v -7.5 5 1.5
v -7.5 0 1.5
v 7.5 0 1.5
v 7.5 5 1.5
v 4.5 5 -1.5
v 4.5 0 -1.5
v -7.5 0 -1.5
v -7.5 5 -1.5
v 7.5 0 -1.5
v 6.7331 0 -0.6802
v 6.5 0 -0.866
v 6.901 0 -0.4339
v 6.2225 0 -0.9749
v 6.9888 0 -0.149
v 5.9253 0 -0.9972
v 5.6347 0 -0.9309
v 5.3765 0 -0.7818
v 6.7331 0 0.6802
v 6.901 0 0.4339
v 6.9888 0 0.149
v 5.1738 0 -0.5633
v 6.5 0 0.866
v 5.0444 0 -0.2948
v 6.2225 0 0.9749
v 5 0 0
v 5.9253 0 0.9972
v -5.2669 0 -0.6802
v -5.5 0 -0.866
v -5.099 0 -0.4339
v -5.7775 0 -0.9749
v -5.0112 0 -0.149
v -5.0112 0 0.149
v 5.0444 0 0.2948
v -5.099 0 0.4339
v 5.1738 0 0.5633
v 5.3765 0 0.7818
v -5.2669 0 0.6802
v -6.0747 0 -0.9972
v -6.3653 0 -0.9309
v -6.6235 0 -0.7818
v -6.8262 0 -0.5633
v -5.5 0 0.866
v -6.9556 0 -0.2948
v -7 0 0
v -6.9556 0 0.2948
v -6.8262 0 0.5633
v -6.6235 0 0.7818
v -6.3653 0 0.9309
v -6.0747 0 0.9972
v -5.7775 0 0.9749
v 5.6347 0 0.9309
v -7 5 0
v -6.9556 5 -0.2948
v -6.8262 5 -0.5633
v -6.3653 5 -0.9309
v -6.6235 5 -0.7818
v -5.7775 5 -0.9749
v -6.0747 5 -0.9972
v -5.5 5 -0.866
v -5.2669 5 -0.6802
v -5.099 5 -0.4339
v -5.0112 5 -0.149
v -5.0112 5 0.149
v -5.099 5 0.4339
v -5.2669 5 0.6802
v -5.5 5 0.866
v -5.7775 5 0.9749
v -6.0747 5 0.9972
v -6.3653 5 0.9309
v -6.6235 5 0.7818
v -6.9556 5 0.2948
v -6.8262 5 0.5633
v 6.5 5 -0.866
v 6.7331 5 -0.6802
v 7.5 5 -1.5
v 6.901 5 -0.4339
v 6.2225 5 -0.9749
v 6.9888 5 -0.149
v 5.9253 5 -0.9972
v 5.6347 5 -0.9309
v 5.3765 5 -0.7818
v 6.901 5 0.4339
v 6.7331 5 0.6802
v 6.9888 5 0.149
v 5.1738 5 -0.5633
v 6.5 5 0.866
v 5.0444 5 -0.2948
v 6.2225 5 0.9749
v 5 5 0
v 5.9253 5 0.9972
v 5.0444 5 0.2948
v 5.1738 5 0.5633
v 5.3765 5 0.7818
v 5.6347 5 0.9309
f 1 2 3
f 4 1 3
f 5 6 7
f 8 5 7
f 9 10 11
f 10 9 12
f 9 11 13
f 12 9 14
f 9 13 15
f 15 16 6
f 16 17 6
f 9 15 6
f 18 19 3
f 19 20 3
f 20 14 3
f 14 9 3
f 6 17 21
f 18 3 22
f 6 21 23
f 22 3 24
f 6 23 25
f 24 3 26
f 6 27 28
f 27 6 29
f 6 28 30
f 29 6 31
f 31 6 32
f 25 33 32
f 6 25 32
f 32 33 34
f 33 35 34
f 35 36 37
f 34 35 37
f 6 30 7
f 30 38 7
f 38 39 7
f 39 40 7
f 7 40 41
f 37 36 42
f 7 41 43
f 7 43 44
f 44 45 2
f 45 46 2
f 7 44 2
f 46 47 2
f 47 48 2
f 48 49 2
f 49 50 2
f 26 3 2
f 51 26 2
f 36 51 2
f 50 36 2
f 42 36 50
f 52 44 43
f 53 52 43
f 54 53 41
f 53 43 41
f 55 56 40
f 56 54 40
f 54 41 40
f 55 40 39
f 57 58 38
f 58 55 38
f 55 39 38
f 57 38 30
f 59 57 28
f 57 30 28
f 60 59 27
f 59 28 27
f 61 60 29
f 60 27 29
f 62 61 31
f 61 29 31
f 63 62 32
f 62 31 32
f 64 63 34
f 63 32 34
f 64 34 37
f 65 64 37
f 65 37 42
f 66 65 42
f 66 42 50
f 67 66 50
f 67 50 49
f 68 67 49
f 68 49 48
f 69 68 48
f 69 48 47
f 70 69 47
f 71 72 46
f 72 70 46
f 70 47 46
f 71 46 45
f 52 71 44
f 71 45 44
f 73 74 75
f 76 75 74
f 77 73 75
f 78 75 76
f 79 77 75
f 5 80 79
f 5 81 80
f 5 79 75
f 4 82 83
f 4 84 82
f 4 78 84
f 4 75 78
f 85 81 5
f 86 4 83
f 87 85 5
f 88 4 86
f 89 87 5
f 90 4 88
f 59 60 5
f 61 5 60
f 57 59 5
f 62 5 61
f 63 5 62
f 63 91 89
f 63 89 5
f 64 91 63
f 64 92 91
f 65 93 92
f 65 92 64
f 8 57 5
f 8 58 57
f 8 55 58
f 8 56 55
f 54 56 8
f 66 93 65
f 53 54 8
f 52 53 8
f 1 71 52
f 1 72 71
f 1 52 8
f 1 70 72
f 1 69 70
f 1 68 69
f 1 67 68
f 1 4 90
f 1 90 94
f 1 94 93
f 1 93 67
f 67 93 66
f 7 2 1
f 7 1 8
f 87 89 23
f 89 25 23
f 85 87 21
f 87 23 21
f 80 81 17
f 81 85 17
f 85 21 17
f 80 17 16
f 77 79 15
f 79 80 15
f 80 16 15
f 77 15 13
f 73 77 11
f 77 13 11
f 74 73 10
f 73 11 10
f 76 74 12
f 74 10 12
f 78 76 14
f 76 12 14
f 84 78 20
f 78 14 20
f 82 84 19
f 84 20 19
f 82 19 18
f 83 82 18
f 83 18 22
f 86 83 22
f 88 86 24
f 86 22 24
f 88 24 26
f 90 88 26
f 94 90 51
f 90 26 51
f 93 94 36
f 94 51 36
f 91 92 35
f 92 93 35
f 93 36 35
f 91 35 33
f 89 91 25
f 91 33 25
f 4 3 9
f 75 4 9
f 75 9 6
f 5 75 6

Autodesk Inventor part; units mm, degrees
ref_plane "YZ Plane" through (0, 0, 0) normal (1, 0, 0) x (0, 1, 0)
ref_plane "XZ Plane" through (0, 0, 0) normal (0, 1, 0) x (-1, 0, 0)
ref_plane "XY Plane" through (0, 0, 0) normal (0, 0, 1) x (1, 0, 0)
sketch "Sketch1" plane through (0, 0, 0) normal (0, 1, 0) x (-1, 0, 0)
  line L0 (-7.5, -1.5) -> (7.5, -1.5)
  line L1 (7.5, 3.5) -> (7.5, 3.5)
  line L2 (7.5, 1.5) -> (-7.5, 1.5)
  line L3 (-7.5, 3.5) -> (-7.5, 3.5)
  line L4 (-7.5, -1.5) -> (7.5, 1.5) construction
  line L5 (7.5, -1.5) -> (-7.5, 1.5) construction
  circle A0 centre (6, 0) radius 1
  line L6 (-7.5, 1.5) -> (-7.5, -1.5)
  line L7 (7.5, 1.5) -> (7.5, -1.5)
  line L8 (-7.5, -1.5) -> (-4.5, -1.5)
  circle A1 centre (-6, 0) radius 1
  point P0 (0, 0)
  point P1 (-7.5, 0)
  dimension "d0" = 3
  dimension "d1" = 15
  dimension "d3" = 2
  dimension "d6" = 1.5
  dimension "d8" = 1.5
  dimension "d21" = 2
  dimension "d22" = 1.5
  dimension "d23" = 1.5
extrude "Extrusion1" add sketch "Sketch1" along normal blind 5
properties part number "link"
